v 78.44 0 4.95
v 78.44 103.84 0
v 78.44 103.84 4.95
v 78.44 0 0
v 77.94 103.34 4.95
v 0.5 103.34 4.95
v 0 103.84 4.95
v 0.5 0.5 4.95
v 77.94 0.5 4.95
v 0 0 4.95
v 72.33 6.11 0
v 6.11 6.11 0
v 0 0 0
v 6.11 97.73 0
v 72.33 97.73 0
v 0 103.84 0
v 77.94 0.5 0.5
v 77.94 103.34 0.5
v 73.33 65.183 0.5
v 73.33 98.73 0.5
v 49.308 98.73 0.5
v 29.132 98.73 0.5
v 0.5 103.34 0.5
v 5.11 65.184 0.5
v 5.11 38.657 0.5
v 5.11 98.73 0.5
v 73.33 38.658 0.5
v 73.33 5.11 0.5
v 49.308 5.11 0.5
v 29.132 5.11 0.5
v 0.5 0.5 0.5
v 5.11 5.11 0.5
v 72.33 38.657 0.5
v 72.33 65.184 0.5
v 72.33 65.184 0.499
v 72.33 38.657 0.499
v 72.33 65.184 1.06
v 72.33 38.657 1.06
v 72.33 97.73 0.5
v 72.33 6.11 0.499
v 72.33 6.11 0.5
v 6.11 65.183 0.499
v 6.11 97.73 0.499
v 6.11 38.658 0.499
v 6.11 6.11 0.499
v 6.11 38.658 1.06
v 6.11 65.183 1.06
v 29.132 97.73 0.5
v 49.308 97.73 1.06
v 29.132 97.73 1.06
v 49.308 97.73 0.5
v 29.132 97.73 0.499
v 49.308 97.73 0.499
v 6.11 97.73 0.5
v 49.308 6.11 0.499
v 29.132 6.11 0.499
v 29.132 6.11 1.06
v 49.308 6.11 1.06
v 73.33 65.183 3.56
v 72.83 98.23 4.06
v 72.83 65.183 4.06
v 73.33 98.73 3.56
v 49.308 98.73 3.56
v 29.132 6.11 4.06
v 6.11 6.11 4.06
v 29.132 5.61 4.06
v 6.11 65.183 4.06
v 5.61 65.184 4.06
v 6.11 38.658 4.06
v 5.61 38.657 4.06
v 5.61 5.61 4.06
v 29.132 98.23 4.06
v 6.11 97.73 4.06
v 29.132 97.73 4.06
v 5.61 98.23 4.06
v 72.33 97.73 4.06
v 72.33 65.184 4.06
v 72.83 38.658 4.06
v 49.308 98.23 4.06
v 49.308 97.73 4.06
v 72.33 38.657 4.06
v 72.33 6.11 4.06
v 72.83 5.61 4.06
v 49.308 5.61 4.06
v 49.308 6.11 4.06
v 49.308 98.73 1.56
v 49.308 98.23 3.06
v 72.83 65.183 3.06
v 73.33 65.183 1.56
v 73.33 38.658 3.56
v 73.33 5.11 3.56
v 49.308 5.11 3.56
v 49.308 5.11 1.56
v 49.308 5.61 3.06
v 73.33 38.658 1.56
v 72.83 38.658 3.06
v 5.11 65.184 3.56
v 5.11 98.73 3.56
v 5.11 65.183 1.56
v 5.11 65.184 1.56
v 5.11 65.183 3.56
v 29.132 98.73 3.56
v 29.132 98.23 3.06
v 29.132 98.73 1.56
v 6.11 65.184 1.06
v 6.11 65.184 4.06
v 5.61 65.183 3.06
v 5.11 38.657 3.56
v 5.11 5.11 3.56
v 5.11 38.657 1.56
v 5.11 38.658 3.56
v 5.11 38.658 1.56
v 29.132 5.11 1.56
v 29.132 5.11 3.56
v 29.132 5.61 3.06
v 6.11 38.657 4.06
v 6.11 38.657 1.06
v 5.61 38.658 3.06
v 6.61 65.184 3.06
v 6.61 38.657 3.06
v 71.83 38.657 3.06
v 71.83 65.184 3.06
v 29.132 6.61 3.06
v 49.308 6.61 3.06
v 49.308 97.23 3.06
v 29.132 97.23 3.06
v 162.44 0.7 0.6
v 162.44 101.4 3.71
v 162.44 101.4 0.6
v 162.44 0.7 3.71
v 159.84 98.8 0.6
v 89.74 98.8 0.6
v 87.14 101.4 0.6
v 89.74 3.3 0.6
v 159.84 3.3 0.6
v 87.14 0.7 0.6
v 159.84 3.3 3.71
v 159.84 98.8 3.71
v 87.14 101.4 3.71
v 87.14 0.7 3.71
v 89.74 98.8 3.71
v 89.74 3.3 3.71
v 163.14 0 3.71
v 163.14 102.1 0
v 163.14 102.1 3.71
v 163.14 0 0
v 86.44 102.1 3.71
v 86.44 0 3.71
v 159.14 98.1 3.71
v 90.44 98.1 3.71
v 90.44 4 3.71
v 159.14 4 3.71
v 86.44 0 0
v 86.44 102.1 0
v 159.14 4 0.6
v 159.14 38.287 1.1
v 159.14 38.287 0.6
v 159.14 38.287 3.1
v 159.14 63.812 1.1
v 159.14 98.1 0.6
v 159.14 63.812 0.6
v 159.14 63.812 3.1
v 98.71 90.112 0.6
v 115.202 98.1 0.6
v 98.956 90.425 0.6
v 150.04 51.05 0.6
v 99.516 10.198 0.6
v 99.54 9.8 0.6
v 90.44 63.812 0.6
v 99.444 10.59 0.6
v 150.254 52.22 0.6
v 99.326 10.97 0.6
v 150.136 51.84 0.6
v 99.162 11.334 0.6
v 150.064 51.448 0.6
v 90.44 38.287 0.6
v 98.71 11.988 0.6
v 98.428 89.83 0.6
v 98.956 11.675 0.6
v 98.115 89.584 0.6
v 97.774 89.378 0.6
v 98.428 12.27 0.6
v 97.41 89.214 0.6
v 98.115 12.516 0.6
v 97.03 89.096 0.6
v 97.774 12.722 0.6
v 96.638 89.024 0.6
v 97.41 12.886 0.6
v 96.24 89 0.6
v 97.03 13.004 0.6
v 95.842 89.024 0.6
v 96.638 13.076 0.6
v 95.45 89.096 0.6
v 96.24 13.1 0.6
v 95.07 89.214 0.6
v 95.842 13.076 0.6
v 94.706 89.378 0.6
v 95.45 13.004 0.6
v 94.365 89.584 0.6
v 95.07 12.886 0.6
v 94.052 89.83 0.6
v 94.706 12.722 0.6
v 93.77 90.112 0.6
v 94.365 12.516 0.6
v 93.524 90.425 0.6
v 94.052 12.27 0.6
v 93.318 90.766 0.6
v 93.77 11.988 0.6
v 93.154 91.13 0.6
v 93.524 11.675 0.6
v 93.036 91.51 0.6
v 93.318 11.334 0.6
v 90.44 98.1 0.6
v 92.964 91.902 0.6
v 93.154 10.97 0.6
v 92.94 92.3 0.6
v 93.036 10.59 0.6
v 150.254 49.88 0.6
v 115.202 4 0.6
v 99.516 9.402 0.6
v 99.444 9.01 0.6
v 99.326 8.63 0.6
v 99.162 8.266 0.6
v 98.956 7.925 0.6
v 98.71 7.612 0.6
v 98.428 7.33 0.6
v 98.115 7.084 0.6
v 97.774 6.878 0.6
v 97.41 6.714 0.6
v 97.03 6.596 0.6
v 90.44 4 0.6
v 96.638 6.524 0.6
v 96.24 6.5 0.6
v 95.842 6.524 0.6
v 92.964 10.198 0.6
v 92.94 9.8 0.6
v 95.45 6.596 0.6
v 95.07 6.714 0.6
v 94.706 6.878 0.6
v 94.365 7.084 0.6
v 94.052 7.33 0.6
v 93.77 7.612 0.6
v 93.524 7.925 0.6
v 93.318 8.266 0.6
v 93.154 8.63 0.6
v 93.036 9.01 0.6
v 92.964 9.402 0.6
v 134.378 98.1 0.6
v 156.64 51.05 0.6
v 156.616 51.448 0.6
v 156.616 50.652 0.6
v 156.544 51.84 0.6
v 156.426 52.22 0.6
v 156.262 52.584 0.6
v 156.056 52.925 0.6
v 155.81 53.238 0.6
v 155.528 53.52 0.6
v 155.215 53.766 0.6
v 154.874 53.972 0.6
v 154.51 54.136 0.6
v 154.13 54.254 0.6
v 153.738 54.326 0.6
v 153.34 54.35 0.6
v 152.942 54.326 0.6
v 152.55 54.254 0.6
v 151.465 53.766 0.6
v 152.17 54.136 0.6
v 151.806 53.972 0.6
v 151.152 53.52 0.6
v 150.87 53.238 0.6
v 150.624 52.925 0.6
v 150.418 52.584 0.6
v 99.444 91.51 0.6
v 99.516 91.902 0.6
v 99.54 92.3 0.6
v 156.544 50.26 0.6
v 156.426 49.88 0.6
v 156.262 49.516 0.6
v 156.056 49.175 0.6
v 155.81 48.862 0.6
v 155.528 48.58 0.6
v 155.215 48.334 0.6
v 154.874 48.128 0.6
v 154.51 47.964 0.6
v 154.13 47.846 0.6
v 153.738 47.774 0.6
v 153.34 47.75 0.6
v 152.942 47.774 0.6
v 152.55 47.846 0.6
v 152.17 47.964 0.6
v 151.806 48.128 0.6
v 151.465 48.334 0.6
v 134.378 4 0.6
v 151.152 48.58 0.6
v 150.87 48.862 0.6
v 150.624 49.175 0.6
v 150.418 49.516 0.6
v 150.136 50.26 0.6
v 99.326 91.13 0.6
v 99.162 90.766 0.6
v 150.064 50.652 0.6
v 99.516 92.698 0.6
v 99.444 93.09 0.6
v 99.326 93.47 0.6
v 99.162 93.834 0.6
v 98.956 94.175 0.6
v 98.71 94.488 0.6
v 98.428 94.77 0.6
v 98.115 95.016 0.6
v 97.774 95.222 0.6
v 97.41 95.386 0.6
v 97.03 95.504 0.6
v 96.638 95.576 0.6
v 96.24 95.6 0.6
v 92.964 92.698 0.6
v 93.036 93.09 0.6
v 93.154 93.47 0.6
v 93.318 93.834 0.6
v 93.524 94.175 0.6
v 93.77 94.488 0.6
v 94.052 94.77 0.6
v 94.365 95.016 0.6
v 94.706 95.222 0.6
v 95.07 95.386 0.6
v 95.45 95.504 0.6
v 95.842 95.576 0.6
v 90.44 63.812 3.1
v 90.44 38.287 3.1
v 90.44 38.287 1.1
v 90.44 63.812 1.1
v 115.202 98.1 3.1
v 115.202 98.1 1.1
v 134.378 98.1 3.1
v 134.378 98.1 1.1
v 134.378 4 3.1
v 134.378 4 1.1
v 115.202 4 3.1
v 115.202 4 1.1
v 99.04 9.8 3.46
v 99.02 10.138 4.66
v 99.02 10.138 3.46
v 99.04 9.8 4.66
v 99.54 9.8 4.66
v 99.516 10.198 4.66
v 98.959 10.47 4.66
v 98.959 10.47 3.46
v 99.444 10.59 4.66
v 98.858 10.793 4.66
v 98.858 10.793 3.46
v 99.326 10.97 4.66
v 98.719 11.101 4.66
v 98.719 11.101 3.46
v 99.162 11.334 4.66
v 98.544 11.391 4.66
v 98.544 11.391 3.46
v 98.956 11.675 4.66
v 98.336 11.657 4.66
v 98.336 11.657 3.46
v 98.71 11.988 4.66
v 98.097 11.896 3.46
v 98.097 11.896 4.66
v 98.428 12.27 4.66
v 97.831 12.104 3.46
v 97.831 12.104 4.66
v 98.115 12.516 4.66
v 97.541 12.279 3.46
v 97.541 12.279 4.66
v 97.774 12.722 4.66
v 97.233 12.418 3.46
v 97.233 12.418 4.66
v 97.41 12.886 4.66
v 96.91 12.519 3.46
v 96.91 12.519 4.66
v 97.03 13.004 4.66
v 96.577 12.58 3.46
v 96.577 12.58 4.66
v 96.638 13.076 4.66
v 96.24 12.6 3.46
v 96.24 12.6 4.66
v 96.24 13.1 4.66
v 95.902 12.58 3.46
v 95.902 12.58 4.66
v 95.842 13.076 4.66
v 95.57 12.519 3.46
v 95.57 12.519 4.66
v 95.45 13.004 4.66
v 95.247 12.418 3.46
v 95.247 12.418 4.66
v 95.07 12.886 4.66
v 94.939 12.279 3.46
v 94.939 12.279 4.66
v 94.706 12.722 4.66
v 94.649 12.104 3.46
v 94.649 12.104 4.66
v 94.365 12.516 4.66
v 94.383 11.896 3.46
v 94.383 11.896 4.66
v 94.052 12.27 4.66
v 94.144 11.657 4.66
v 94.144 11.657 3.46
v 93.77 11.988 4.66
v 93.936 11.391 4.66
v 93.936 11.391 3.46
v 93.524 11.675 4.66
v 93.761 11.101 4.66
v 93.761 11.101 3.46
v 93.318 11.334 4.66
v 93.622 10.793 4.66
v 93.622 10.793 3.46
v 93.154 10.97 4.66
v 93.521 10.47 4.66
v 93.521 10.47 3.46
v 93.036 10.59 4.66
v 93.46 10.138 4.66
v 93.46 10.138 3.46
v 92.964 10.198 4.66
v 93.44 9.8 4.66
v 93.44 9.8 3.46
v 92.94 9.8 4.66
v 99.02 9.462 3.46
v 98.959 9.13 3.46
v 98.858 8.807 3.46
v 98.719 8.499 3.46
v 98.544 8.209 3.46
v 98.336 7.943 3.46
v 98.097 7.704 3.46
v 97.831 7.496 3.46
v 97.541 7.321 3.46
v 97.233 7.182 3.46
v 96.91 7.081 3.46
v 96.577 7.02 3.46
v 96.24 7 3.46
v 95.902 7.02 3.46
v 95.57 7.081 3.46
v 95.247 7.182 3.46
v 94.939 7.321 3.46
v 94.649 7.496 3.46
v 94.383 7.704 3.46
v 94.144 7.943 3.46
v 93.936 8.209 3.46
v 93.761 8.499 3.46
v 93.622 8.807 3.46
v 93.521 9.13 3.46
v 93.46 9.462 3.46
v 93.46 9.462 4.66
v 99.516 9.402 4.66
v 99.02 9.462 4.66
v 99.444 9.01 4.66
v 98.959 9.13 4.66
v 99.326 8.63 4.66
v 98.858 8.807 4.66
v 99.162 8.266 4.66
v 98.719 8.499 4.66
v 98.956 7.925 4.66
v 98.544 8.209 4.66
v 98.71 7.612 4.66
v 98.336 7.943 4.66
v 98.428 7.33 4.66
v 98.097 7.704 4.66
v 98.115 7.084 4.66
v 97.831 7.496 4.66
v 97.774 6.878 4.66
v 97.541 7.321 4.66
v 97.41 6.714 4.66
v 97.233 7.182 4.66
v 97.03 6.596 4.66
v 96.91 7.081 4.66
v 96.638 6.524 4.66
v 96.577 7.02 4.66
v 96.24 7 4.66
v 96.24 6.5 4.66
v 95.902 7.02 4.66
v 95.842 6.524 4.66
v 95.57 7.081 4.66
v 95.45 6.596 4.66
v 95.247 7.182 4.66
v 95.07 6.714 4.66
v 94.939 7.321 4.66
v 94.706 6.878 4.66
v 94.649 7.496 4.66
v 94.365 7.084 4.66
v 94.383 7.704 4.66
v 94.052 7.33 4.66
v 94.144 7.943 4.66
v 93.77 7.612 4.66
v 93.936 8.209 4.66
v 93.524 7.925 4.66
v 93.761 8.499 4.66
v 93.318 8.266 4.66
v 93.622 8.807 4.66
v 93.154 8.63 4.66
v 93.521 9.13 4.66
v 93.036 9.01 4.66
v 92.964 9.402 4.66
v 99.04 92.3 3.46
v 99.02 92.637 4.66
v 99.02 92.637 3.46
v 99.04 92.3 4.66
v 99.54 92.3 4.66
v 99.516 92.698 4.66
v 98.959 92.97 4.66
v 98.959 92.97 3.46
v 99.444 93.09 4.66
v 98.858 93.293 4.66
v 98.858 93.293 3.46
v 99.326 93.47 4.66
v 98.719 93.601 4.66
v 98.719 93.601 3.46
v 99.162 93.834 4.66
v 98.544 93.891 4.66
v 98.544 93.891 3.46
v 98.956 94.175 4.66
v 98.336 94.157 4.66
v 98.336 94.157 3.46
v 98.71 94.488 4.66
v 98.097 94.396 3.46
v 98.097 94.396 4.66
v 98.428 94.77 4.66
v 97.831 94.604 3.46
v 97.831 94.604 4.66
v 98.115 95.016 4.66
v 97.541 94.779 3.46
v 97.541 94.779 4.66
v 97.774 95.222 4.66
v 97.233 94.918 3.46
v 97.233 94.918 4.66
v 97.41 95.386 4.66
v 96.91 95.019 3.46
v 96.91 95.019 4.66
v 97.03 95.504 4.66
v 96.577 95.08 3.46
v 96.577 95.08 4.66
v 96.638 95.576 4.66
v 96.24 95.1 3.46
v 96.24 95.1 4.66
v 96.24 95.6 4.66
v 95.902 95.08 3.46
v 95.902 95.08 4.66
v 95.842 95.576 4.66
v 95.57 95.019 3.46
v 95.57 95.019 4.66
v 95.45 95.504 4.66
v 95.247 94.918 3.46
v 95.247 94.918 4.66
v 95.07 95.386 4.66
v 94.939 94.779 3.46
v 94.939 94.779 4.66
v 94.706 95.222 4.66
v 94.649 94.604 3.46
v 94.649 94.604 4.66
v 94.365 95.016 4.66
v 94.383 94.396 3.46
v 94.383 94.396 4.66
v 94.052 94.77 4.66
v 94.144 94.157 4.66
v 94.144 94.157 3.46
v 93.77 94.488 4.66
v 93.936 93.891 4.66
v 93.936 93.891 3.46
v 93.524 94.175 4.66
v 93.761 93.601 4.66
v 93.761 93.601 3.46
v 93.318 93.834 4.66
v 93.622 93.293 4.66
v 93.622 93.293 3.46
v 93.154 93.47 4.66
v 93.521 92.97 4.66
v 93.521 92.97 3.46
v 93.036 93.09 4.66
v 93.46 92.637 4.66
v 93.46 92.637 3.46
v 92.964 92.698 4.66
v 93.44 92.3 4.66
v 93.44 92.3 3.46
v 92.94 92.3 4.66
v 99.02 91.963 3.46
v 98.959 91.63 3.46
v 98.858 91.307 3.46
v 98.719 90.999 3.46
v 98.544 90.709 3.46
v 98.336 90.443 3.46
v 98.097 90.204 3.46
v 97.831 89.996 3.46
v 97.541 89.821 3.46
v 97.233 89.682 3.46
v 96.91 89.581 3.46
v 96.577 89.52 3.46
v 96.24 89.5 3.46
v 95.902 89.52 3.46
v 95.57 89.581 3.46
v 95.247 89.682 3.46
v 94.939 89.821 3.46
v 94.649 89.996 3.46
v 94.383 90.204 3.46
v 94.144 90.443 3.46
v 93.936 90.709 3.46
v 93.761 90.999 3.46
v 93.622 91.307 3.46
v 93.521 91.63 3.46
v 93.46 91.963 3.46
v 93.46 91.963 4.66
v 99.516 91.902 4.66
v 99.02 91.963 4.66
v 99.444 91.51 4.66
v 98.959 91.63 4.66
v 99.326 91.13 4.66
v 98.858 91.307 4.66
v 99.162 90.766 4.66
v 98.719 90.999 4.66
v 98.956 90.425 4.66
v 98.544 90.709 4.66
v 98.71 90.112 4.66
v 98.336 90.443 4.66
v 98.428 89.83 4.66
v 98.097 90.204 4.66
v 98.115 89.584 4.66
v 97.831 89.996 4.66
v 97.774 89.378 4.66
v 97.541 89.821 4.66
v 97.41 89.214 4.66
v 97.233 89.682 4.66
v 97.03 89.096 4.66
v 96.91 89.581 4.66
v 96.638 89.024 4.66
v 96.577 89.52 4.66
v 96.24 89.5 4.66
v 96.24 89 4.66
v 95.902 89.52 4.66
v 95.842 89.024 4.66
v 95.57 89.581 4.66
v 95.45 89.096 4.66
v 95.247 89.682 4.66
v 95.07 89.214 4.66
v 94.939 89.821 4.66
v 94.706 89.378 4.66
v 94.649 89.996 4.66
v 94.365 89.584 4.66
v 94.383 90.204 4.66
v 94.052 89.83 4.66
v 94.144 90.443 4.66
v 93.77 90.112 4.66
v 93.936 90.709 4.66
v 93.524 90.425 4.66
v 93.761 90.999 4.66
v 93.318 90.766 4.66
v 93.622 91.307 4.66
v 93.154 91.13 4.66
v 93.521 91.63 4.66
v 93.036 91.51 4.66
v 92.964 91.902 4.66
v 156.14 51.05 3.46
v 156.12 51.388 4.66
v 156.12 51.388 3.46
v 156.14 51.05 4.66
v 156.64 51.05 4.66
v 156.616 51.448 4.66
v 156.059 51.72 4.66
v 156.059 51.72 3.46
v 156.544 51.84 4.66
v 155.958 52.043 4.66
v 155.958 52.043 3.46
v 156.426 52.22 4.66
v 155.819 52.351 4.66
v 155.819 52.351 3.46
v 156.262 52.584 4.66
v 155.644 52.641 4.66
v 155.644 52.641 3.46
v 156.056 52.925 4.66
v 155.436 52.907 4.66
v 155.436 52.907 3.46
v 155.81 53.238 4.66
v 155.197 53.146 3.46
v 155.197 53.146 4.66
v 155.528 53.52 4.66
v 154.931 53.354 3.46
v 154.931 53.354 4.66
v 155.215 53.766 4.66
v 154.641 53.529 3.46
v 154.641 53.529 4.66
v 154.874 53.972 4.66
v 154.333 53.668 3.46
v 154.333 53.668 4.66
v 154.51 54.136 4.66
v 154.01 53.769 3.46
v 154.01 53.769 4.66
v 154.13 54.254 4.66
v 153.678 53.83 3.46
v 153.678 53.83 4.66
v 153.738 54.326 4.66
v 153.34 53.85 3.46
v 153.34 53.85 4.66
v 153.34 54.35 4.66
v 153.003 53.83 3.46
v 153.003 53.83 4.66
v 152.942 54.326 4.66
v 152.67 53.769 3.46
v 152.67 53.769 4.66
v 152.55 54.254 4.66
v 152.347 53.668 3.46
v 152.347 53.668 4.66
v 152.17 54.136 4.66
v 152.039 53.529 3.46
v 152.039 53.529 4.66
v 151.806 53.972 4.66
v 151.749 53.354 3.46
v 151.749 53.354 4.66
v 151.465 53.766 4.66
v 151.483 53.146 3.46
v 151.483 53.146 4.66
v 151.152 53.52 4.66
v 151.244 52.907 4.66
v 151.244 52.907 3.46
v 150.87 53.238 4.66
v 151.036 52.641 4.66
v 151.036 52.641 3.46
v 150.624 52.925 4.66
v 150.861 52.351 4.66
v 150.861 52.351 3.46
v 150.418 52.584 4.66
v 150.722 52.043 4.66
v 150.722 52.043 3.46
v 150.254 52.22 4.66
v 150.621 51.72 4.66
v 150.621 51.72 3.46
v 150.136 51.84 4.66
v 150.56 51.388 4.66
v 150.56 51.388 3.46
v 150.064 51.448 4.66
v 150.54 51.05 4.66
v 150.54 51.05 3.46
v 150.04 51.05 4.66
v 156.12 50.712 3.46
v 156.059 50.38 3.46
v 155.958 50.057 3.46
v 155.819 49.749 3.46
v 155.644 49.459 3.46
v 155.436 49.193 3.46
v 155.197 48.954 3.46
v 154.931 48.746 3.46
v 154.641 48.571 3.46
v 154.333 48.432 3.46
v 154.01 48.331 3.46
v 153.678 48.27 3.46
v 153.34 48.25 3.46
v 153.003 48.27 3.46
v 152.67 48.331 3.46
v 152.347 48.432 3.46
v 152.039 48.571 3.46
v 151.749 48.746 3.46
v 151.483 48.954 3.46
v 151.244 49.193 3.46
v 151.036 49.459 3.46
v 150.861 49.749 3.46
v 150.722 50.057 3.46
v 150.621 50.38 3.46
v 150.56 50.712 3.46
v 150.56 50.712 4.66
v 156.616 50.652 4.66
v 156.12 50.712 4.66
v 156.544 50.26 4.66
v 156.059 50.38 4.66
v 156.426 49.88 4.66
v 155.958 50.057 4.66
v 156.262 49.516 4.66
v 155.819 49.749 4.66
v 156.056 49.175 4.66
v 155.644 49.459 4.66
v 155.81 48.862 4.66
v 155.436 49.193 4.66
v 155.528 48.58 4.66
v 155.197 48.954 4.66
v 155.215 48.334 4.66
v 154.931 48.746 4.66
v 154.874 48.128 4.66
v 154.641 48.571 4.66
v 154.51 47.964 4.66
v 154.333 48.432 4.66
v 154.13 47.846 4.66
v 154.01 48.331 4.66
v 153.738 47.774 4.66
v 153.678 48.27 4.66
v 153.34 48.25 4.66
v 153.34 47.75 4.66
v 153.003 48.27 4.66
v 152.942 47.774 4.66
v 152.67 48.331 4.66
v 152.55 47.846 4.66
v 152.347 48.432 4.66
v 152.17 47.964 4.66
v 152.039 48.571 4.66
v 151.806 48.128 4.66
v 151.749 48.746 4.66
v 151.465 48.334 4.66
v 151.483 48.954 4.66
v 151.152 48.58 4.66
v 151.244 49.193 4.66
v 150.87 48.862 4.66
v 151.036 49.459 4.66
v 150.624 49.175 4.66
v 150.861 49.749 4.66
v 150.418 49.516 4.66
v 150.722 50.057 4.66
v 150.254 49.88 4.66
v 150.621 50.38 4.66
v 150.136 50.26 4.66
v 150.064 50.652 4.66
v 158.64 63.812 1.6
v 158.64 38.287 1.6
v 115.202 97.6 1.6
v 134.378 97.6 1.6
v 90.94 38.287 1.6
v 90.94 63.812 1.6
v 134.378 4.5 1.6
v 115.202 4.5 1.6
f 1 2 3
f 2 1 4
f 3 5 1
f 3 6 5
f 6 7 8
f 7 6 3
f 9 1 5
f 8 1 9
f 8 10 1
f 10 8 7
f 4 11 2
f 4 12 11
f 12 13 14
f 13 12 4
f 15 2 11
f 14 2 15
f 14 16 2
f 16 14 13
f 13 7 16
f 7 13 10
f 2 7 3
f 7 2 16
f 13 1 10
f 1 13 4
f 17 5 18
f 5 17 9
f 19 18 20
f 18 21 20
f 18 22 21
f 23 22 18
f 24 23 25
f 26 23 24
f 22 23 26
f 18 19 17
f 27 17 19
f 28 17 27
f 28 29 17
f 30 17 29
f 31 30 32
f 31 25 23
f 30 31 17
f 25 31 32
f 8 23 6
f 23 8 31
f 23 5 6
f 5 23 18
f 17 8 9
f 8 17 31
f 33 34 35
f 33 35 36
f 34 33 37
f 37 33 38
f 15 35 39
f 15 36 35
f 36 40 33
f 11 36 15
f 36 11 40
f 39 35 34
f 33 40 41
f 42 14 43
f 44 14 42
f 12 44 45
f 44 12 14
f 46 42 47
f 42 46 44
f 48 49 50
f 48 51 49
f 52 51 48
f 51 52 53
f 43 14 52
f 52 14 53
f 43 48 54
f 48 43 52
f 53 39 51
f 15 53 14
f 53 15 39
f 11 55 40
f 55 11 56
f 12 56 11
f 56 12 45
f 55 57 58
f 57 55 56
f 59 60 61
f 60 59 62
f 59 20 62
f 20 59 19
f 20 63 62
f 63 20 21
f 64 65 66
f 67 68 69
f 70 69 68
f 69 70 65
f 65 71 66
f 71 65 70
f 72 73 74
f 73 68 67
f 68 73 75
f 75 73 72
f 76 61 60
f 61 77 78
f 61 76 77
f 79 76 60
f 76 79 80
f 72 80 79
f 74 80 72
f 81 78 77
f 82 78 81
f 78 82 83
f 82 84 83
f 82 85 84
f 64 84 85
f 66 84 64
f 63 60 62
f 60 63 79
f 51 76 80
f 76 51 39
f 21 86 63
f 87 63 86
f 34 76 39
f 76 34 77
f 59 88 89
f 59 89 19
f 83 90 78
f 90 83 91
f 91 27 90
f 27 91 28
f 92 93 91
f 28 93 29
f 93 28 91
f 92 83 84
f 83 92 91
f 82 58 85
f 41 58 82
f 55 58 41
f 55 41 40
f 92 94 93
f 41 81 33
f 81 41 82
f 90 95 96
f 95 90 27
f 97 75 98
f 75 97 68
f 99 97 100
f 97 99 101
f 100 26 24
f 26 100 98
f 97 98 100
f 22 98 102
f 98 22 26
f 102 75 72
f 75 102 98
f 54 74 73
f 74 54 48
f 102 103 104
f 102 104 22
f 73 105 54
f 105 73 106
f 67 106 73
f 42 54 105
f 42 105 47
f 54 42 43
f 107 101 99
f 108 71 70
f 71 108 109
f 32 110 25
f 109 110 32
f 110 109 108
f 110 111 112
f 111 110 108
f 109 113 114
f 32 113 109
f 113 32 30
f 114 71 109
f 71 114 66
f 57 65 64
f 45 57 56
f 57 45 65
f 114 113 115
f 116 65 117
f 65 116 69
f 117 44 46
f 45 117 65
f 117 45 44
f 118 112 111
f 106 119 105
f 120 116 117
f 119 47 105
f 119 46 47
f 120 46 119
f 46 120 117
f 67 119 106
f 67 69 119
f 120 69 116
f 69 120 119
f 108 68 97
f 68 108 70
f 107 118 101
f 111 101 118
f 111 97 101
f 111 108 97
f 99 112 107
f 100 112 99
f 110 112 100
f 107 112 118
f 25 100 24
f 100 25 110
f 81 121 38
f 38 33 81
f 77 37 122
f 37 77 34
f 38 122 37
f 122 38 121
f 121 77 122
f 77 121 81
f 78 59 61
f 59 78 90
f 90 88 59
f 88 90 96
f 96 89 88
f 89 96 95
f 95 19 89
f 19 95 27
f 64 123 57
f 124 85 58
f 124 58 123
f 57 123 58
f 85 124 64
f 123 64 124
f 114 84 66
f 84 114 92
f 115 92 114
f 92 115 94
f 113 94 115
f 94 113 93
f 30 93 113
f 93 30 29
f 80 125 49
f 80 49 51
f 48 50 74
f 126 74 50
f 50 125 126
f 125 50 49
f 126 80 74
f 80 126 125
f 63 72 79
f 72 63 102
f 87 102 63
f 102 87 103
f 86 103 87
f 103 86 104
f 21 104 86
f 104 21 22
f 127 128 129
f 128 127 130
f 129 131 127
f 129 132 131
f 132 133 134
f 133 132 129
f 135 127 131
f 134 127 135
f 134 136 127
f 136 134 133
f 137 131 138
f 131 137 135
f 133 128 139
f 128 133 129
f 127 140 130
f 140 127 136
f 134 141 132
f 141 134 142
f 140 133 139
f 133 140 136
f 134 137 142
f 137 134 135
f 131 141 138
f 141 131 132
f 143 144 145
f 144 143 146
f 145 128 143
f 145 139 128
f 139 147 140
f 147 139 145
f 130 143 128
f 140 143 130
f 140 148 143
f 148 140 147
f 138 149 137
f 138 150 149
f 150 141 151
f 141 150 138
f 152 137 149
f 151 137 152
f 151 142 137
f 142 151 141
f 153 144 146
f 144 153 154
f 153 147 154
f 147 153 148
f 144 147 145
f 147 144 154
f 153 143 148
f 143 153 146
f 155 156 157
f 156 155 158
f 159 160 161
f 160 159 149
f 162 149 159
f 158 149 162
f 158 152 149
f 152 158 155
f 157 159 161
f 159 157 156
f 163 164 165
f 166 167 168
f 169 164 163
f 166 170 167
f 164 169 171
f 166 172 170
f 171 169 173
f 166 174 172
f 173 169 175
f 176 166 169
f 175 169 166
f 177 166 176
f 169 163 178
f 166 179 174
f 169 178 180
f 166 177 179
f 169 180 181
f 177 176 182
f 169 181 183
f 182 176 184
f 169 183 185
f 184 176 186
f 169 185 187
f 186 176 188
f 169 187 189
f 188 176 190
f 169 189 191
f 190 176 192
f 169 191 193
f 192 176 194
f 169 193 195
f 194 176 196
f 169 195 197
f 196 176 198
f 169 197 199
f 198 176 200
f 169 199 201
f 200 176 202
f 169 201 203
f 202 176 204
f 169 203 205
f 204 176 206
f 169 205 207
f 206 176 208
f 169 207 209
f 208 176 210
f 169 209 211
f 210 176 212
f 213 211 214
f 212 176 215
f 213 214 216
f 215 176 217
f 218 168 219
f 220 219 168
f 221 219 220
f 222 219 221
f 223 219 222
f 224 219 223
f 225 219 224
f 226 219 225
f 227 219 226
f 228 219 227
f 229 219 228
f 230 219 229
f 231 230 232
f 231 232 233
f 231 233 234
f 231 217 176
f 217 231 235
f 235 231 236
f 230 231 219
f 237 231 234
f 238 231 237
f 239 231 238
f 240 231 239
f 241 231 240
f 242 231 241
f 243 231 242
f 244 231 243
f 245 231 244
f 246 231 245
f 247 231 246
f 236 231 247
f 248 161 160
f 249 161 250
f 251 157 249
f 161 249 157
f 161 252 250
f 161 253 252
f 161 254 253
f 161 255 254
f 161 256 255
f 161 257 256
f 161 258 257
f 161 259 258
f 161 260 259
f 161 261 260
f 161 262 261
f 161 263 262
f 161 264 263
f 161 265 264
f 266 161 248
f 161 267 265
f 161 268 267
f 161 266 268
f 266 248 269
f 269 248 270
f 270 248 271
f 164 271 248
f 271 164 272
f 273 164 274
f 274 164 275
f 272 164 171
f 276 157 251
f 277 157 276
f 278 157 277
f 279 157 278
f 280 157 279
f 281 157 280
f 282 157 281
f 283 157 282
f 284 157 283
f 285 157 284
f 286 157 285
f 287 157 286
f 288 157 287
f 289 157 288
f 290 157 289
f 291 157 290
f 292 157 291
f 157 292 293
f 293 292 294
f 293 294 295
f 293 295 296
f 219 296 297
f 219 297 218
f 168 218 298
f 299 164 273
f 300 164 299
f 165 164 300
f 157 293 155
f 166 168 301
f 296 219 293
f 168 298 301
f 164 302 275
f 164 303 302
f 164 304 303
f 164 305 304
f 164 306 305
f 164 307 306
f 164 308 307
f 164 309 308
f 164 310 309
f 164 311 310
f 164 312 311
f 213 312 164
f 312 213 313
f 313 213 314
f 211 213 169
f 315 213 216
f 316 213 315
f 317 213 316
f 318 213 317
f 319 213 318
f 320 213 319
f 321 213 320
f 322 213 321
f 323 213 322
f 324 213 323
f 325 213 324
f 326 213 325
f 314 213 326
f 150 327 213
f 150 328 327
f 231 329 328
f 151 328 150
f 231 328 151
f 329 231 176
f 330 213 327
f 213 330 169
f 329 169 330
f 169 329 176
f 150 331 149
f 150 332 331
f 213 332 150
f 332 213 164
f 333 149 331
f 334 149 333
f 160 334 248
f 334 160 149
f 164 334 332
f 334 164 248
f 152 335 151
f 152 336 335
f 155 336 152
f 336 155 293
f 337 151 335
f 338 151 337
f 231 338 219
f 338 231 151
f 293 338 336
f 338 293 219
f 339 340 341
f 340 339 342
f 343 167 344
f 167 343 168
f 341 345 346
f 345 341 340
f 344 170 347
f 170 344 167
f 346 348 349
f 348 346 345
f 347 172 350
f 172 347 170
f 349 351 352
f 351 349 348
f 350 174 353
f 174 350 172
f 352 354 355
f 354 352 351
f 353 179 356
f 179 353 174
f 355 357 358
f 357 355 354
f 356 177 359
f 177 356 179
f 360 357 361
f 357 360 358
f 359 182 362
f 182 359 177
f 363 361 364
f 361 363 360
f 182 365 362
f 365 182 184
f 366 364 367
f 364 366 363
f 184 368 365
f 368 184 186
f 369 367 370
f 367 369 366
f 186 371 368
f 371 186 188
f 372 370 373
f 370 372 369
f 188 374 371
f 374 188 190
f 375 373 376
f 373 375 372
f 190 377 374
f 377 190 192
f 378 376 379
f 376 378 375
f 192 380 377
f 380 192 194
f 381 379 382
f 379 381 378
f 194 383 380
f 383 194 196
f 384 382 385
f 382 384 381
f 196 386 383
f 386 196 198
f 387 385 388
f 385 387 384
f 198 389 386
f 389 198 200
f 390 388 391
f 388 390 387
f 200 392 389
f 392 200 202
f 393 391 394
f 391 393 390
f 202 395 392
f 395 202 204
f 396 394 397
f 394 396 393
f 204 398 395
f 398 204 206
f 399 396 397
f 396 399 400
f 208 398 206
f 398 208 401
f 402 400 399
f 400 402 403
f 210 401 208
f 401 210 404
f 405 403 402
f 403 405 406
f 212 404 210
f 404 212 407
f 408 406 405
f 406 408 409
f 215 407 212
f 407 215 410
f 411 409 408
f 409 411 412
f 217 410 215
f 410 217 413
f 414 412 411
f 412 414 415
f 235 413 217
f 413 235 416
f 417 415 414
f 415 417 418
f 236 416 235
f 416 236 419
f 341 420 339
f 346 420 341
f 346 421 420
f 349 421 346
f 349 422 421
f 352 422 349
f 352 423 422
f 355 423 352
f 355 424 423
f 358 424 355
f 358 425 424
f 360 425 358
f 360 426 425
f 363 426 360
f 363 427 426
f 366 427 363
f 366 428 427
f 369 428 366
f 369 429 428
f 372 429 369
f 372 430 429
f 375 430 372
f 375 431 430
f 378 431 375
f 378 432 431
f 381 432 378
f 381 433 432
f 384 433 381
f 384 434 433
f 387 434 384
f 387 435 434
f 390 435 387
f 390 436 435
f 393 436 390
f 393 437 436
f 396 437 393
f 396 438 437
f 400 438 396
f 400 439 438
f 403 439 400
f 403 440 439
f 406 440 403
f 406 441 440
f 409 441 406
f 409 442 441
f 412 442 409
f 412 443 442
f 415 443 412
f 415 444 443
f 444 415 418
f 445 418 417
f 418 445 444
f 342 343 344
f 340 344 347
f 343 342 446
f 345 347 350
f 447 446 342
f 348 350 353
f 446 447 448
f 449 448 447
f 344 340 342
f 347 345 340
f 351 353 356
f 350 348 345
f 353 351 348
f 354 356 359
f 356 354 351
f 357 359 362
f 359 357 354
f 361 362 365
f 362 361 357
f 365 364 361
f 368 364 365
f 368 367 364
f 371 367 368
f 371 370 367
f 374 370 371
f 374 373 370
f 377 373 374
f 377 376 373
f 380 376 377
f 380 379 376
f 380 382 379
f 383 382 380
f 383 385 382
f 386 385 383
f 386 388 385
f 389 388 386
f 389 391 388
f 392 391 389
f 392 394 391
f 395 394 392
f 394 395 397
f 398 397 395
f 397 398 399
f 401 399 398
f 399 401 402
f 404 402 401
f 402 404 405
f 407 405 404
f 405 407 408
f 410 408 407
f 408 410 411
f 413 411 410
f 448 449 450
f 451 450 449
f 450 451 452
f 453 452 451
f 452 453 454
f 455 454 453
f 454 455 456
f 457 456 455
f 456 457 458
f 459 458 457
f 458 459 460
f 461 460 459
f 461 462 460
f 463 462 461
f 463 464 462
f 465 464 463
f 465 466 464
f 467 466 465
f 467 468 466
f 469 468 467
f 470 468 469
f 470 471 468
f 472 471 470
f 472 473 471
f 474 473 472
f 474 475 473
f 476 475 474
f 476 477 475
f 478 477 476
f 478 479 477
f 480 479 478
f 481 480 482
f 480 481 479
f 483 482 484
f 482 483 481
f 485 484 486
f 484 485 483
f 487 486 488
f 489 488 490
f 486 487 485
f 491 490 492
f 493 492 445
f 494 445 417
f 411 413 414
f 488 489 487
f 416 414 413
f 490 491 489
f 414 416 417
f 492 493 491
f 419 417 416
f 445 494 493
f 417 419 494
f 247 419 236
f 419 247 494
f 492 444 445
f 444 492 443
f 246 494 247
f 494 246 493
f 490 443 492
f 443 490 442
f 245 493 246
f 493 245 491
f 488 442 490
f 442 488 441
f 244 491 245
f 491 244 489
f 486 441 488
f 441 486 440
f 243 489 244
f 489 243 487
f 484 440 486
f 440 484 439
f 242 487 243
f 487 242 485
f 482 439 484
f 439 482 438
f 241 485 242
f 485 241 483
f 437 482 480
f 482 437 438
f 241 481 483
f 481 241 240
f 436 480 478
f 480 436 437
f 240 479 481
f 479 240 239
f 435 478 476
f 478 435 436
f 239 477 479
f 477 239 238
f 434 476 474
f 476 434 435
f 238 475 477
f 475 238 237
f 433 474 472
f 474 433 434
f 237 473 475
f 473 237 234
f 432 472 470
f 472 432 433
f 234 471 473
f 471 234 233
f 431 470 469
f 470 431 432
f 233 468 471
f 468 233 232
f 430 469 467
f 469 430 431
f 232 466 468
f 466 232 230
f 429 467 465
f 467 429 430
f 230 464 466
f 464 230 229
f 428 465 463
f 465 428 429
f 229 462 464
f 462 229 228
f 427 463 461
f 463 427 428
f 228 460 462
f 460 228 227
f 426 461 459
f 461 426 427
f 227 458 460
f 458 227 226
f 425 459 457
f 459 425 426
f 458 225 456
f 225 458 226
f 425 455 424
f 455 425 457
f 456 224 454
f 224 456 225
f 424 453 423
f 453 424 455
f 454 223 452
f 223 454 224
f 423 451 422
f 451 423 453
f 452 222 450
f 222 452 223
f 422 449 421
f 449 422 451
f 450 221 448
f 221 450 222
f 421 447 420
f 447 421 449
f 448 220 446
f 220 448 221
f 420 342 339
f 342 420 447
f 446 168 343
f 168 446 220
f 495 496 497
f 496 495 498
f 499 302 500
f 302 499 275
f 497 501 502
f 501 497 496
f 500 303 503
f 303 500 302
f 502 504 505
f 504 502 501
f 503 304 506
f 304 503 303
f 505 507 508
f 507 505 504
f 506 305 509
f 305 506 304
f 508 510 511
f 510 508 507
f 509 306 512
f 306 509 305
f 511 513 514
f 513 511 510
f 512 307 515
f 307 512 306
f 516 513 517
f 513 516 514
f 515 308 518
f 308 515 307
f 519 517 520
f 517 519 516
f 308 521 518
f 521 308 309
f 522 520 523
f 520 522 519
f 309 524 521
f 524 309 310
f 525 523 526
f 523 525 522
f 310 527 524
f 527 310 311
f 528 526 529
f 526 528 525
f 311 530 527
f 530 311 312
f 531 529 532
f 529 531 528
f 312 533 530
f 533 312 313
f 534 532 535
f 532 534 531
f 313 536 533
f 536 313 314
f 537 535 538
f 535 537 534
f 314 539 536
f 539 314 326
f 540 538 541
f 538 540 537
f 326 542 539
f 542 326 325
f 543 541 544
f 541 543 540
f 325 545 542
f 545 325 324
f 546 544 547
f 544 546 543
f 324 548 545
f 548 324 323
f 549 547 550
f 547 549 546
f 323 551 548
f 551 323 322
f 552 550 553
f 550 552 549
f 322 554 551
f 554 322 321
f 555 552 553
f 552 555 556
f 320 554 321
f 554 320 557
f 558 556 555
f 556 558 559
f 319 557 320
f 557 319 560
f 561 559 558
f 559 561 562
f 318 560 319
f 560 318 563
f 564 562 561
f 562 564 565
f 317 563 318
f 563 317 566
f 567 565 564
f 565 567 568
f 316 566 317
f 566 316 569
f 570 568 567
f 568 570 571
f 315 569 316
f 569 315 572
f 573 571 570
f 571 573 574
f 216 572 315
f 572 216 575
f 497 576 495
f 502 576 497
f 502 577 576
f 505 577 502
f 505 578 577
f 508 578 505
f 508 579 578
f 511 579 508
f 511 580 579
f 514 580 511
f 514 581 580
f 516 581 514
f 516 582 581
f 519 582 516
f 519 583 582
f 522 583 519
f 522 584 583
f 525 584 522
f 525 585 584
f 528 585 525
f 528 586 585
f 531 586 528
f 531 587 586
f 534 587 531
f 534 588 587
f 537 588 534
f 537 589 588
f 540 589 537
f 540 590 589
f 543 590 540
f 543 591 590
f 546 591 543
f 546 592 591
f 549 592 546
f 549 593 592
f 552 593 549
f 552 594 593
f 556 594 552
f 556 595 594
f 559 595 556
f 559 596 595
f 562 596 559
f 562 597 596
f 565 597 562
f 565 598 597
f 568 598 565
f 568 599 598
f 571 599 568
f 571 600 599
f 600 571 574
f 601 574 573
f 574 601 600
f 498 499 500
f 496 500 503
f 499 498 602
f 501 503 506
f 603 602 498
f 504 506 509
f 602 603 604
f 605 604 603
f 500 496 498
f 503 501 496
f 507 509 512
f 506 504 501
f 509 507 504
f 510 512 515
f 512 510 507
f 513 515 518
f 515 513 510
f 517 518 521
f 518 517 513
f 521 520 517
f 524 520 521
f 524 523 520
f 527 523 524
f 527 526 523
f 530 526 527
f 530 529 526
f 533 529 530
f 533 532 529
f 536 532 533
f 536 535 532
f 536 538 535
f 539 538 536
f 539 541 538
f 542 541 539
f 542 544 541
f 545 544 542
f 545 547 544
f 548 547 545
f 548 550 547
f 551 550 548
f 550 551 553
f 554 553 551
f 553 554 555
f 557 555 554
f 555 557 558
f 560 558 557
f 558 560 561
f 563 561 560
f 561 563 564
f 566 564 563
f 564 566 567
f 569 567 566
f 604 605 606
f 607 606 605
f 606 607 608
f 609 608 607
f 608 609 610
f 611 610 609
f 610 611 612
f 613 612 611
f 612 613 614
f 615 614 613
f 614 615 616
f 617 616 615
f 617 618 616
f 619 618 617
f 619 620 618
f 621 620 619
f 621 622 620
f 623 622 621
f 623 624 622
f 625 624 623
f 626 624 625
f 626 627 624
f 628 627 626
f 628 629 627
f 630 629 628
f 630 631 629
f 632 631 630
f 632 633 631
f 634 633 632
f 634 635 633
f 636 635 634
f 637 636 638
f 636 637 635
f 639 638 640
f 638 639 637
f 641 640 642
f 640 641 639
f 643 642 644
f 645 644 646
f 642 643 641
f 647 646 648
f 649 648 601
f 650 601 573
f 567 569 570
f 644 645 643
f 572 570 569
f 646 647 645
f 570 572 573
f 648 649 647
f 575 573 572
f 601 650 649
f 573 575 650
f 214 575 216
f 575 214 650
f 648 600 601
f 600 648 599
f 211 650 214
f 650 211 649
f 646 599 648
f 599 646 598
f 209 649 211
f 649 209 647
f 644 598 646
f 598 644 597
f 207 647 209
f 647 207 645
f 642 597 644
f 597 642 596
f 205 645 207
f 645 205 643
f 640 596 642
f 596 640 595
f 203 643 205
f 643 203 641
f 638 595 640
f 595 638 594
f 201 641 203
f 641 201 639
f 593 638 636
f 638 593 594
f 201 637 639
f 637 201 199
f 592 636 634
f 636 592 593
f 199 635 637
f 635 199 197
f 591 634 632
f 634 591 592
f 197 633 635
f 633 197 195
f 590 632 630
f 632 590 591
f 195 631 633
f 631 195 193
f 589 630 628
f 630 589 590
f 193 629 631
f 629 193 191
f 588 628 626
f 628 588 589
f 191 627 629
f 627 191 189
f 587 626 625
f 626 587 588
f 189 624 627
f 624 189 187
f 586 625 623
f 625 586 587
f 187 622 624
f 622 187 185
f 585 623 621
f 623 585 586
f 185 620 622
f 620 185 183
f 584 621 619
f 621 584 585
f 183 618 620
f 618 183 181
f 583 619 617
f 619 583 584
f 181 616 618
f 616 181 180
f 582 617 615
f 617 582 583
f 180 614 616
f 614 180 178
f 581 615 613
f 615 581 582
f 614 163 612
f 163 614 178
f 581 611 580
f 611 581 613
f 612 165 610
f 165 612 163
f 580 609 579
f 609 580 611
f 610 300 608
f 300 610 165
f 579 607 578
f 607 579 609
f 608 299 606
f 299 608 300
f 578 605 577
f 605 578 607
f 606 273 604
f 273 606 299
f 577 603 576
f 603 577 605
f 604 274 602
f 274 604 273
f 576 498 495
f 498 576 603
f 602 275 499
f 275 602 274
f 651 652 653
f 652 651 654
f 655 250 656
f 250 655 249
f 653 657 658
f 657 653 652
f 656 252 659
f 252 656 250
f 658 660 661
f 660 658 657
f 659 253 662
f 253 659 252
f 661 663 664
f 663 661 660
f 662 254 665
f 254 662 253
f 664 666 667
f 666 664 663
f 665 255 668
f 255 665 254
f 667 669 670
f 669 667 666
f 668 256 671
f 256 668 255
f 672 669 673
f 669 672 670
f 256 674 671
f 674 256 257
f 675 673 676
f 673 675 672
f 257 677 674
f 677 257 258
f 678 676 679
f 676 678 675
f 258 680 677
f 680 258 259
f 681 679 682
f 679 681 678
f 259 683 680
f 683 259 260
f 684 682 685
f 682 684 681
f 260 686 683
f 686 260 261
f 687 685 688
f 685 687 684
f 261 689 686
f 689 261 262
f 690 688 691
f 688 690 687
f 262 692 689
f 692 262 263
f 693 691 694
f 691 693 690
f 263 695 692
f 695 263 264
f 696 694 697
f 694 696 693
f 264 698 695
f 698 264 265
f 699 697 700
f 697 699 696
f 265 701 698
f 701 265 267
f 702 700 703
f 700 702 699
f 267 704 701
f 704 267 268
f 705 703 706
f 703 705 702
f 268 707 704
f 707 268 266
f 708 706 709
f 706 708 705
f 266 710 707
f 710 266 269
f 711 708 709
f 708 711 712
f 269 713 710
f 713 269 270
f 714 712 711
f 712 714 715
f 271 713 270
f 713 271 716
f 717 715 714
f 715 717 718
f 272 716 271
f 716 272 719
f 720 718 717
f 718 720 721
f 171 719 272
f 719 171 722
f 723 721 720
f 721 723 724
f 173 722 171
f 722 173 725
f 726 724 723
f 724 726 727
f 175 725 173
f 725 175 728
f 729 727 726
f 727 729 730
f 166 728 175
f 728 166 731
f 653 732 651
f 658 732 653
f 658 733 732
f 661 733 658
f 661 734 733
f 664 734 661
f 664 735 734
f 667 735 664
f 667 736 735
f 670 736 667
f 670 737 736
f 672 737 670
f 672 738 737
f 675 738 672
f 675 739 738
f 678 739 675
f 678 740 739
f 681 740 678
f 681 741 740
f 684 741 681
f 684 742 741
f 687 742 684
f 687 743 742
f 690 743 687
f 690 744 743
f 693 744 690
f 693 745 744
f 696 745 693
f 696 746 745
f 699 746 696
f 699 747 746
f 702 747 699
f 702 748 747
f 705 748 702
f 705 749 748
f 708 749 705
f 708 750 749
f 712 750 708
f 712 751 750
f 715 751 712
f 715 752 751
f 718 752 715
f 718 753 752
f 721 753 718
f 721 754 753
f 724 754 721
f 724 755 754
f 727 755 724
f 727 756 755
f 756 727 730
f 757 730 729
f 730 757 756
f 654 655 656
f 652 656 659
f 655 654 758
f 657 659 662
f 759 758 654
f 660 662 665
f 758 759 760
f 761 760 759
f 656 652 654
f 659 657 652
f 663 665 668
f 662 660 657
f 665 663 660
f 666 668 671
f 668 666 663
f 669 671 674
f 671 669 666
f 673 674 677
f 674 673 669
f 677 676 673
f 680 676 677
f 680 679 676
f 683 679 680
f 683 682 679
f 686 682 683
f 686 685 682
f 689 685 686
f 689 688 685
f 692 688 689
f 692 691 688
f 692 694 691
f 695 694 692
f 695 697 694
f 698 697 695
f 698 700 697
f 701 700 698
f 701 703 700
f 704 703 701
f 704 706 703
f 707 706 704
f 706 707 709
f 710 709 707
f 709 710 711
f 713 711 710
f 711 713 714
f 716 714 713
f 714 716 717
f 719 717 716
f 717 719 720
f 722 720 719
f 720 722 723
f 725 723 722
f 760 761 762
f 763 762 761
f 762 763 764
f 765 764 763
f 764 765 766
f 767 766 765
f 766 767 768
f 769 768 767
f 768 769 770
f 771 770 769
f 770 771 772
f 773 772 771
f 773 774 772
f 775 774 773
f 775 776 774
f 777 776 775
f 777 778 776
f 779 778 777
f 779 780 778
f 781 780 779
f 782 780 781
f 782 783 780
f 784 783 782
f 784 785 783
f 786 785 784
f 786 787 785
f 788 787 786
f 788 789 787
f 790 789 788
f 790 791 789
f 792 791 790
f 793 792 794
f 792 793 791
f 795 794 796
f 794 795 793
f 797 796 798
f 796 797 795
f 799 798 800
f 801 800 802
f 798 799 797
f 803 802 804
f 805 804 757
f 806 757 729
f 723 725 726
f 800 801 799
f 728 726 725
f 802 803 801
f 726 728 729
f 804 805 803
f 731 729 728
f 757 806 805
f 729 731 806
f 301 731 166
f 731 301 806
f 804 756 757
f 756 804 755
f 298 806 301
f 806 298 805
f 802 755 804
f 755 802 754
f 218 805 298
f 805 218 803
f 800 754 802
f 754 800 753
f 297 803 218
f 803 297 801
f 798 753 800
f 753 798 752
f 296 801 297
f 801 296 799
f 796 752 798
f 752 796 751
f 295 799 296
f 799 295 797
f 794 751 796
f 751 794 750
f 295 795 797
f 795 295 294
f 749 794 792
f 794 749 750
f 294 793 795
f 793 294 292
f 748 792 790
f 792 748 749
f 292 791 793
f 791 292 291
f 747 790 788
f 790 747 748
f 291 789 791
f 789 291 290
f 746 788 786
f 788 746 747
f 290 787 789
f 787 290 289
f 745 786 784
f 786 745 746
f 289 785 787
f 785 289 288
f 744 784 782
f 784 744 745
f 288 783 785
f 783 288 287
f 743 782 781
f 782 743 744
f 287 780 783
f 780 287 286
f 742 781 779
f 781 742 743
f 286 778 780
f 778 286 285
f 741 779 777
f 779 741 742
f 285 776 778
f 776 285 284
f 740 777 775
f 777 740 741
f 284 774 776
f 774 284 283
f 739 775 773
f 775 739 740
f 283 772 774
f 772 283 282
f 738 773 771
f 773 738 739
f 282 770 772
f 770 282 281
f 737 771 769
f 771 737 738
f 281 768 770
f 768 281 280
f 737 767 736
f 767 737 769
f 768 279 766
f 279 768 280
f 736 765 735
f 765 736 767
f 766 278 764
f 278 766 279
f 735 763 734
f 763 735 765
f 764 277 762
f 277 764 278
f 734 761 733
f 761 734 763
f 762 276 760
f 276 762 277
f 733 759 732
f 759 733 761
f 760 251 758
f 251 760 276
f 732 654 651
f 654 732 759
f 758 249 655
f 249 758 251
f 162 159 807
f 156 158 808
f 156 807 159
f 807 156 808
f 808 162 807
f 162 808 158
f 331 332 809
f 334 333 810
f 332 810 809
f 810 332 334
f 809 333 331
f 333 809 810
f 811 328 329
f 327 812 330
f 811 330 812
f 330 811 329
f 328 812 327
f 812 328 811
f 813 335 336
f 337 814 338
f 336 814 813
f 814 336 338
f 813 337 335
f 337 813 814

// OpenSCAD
/*
 Magnet Block Frame
 Copyright 2024 Tyler Tork
 
 This model is a snap-together case for a refrigerator magnet, to contain artwork that's folded around a 3D-printed block to make a block with "painted" sides, then a transparent sleeve that snaps on from the back to cover the edges of the work in a clear layer that lets their color show through.
 
 This model is parameterized using the Customizer to let you specify the dimensions of the artwork. It assumes art that's laid out as a rectangular picture with a flap attached to each side. Select the Layout as "Artwork template" to get the outline to cut out the paper that will fit the block.
 
 It's designed for easy printing. No supports are required. The "shell" part doesn't have a large surface area in contact with the plate, so you may want a brim. The "block" part has a nice big first layer so it should be fine.
 
 I suggest glueing the back of the artwork to the block so it lies flat. It's up to you whether to use glue to secure the two parts together -- it's not easy to separate them once they snap together so I don't bother.
 
 You will of course have to glue the magnets into position, if you choose to add some.

 The shell is intended to be printed in clear ("natural") material that has a bit of flex to it -- regular old PLA is fine.

 The block doesn't need to be clear, but a light color is good if your artwork is thin enough that the color might show through a little.
 
 The Layout option lets you choose to export either the shell or the block for printing -- not both together. Since they don't need to both be transparent and you can use any inexpensive material for the block, it's unlikely you'll want to print them in a single job.

 Licensed under Creative Commons - Attribution - Non-Commercial - Share Alike
    https://creativecommons.org/licenses/by-nc-sa/4.0/
 */

Layout = "d"; // [d: Assembly diagram, b: Block only, s: Shell only, a:Artwork template]
// (mm) leeway allowed for imprecise printing, depending on your printer and material used.
tolerance = .16; // .01

/* [Artwork dimensions] */

// (mm) Size of picture to appear on front of block:
picture_size = [76.7, 102.1];
// (mm) colored margin to fold around the sides:
flap_width = 4; // .1
// .21=cardstock, .29=photo paper
paper_thickness = .29; // .01

/* [Shell dimensions] */
side_thickness = 0.5;
back_thickness = 0.5;

/* [Block dimensions] */
front_thickness = 0.6;
// the side thickness is the space between the edge and the inner hollow. The wall thickness allows for material savings by making the outer edge of the block hollow.
block_side_thickness = 4.0; // 0.1
block_WALL_thickness = 0.7; // 0.05

/* [Magnet settings] */
magnet_option = 3; // [3:3 round magnets,4:4 round magnets,0:none,1:platforms for magnet tape]
// Need not be a tight fit.
magnet_diameter = 5.6; // .1
// Let magnet protrude a little for better contact in case back not perfectly flat.
magnet_depth = 1.2; // .1

/* [Hidden] */
$fa = 1;
$fs = 0.4;
Tol = tolerance;
fw = flap_width;
ft = front_thickness;
fs = side_thickness;
pt = paper_thickness;
fb = back_thickness;
bs = block_side_thickness;
bw = block_WALL_thickness;
fsi = 1.0;
fe = bs + pt + 2*Tol + fsi + fs;
hmm = magnet_option;
mw = magnet_diameter;
md = magnet_depth;
magnet_offset = bs + 3 + (hmm == 1 ? 0 : mw/2); // distance of center of magnet post from edge of block
dPic = [min(picture_size), max(picture_size)]; // orient small dimension along X axis because the magnet positioning code assumes this is the case.
dBlock = [dPic.x, dPic.y, fw-pt ];
hdBlock = dBlock/2; // for centering adjustments
dShell = dBlock + [(fs+pt)*2+Tol, (fs+pt)*2+Tol, Tol+2*pt+fb];
bfw = bs-.5; // width of diagonal-cut flap on artwork
wedge_ht = .5;
wedge_len = [min(30, dBlock.x/4), min(30, dBlock.y/4)];
magnet_post_ht = dShell.z-ft-pt;

// inward-facing protrusion for the clip fastening.
wedge_poly = [[-.001,0],
    [0, 0],
    [wedge_ht, 1.5],
    [0, 2],
    [0, 2.501],
    [-.001,2.501]
 ];

// the shell's inner vertical surface has a beveled edge along the "flat" part and a groove to mate with the block's wedge.
function groove_poly(flat=false) =
    let(top = Tol+pt+dBlock.z-ft)
    flat
    ? [ [0,-.001],
        [0,top-.5],
        [.5,top],
        [fsi,top],
        [fsi,-.001] ]
    : [ [0,-.001],
        [0,top-2.5],
        [wedge_ht,top-1],
        [0,top-.5],
        [.5,top],
        [fsi,top],
        [wedge_ht+fsi,top-1],
        [fsi,top-3],
        [fsi,-.001] ];

/* create a part-cylinder with a specified angle, and optionally a poking-out bit to connect it to an adjacent slab. For making rounded corners to join flat pieces. The result is oriented like a cylinder -- with the center of curvature at the origin.
    
    extend: if >0 add a connecting piece to overlap the cube you want to butt up against the flat faces.
*/
module roundedCorner(h=10,r=2,angle=90,extend=0, center=false) {
    steps=floor(angle/$fa);
    step = max(1,angle/steps);
    endpoint = [r*cos(angle),r*sin(angle)];
    endExtend = (extend > 0? (extend*[cos(angle+90), sin(angle+90)]):[0,0]);
    echo("endpoint", endpoint, "endExtend", endExtend);
    
    points = concat(
        extend>0?([[0,0],[0,-extend],[r,-extend],[r,0]]):[[0,0],[r,0]],
        [for(a=[0:step:angle-.001]) [r*cos(a),r*sin(a)]],
        [endpoint],
        extend>0?([endpoint+endExtend, endExtend, [0,0]]) : [[0,0]]
    );
    
    linear_extrude(height=h, center=center)
    polygon(points);
}

/* support post for cylindrical magnets, designed to be just tall enough to sit on the back surface of the block and come out flush with the back surface of the shell after they snap together (i.e. it's a little taller than the outer walls of the block). */
module magnetSupport() {
    mr = mw / 2;
    ht = magnet_post_ht+.001;
    points = [ [0,md], [mr,md], [mr,0], [mr+.5,0],
                [mr+.5,ht], [0,ht]];
    
    rotate_extrude()
     polygon(points);
}

/* Create a flat shape showing the cut outline for a paper that will wrap exactly around the block. */
module art_template() {
    pX = [
            [-dPic.x/2, 0],
            [bfw-dPic.x/2, bfw],
            [dPic.x/2-bfw, bfw],
            [dPic.x/2, 0]
         ];
    pY = [
            [0,-dPic.y/2],
            [bfw, bfw-dPic.y/2],
            [bfw, dPic.y/2-bfw],
            [0, dPic.y/2]
         ];
         
    color("yellow") square(dPic, center = true);
    for (d = [-1, 1]) {
        color("gold")
            translate([d*(dPic.x+fw)/2,0,0])
            square([flap_width, dPic.y], center=true);

        color("gold")
            translate([0, d*(dPic.y+fw)/2,0])
            square([dPic.x, flap_width], center=true);
        
        color("white")
            translate([0,d*(fw + dPic.y/2),0])
            scale([1,d,1])
            polygon(pX);
        
        color("white")
            translate([d*(fw + dPic.x/2),0])
            scale([d,1,1])
            polygon(pY);
    }
}

/* The part of inner upright of the shell that includes one corner and two adjacent "flat" sections, up to where they touch the "grooved" section in the middle of the side. */
module shellInnerCorner(x,y) {
    m=.001;
    // create a corner cube beveled on two sides
    ptFlat = groove_poly(true);
    rotate([90,0,0])
    intersection()
    {
        translate([-fsi,0,0]) linear_extrude(fsi) polygon(ptFlat);
            translate([-fsi,0,fsi]) rotate([0,90,0]) linear_extrude(fsi) polygon(ptFlat);
    }
    // attach a wall to the corner that's beveled on one edge.
    translate([-m,-fsi,0])
        rotate([90,0,90])
        linear_extrude(x+m)
        polygon(ptFlat);
    translate([-fsi,y,0])
        rotate([90,0,0])
        linear_extrude(y+m)
        polygon(ptFlat);            
}

/* shell is the transparent outer shell.
   Render oriented for printing, with one corner at the origin. */
module shell() {
    dInner = dShell-[2*fe, 2*fe, 0];
    color("#ccccff", .5)
    union() {
        difference() {
            // the outer box
            cube(dShell);
            // carve out the inside to make a box
            translate([fs,fs,fb])
                cube(dShell-[2*fs,2*fs,0]);
            // cut a hole in the bottom of the box
            translate([fe,fe,-.1])
                cube(dInner);
        }
        // build walls on the inside of the shell to make a U-shaped cross section.
        p = wedge_len+[1,1];
        e = [(dInner.x-p.x)/2, (dInner.y-p.y)/2];
        t = e + [bs,bs];
        // cross section of grooved wall to snap to the wedge on the block part.
        ptFlat = groove_poly(true);
        // cross section of flat beveled wall.
        ptGroove = groove_poly(false);
        center = [dShell.x/2, dShell.y/2];
        xoff = dInner.x/2;
        yoff = dInner.y/2;
        // place a right-angled bit of wall at each inside corner
        for(dx = [-1,1], dy=[-1,1]) {
            translate([center.x-dx*xoff, center.y-dy*yoff, fb])
            scale([dx, dy, 1])
            shellInnerCorner(e.x,e.y);
        }
        // fill in the gaps in the middle of each wall with a grooved section.
        for(par=[[p.y,-1,0],[p.y,1,0],[p.x,0,-1],[p.x,0,1]]) {
            angle = 90*(1+par[1]+par[2]+abs(par[2]));
            translate([center.x+par[1]*(fsi+xoff),center.y+par[2]*(fsi+yoff),fb])
                rotate([90,0,angle])
                linear_extrude(par[0]+.002, center=true)
                polygon(ptGroove);
        }
    }
}

/* block:
    create the part the picture is folded around.
    This is generated with a corner at the origin and laid flat on the XY plane, in printing orientation (front facing down).
*/
module block() {
    // basic shape of block is hollow box.
    color("#ffdddd")
    translate(hdBlock)
    union() {
        difference() {
            cube(dBlock, center=true);
            translate([0,0,ft])
            cube(dBlock-[bs*2,bs*2,0], center=true);
			channelWidth = bs-2*bw;
			echo("channelWidth", channelWidth);
			if (bw >= 0.5 && channelWidth >= 1.5) {
				// don't hollow out the block edge unless the channel is wide enough that we're actually saving material, considering there would generally be infill anyway.
				translate([hdBlock.x-bw-channelWidth, bw-hdBlock.y, ft-hdBlock.z])
				 cube([channelWidth, dBlock.y-2*bw, dBlock.z]);
				translate([bw, bw, ft]-hdBlock)
				 cube([channelWidth, dBlock.y-2*bw, dBlock.z]);
				translate([bw, bw, ft]-hdBlock)
				 cube([dBlock.x-2*bw, channelWidth, dBlock.z]);
				translate([bw-hdBlock.x,hdBlock.y-bw-channelWidth, ft-hdBlock.z])
				 cube([dBlock.x-2*bw, channelWidth, dBlock.z]);
			}
        }
        
        if (hmm == 1) {
            // customizer selected flat areas for magnetic tape.
            translate([0,dBlock.y/2-magnet_offset-6.5,0])
                cube([dBlock.x-magnet_offset*2, 13, dBlock.z], center=true);
            translate([0,-(dBlock.y/2-magnet_offset-6.5),0])
                cube([dBlock.x-magnet_offset*2, 13, dBlock.z], center=true);
        } else if (hmm != 0) {
            // magnet support posts were selected.
            off = [dBlock.x/2-magnet_offset,dBlock.y/2-magnet_offset,ft-dBlock.z/2+magnet_post_ht];
            // 3 or 4 posts
            locs = hmm == 3
                ? [[-1,-1],[-1,1],[1,0]]
                : [[-1,-1],[-1,1],[1,-1],[1,1]];
            for(p = locs) {
                translate([off.x*p.x,off.y*p.y,off.z])
                rotate([0,180,0])
                magnetSupport();
            }
        }
        
        // wedges in the middle of each inner side.
        pads = [[1,0],[0,1],[-1,0],[0,-1]];
        for (i=[0:3]) {
            oy = i%2;
            ox = floor(i/2);
            translate([(dBlock.x/2-bs)*pads[i].x, (dBlock.y/2-bs)*pads[i].y,2.5+ft-dBlock.z/2])
            rotate([90,180,i*90]) linear_extrude(wedge_len[1-oy],center=true) polygon(wedge_poly);
        }
        echo("wedge_len", wedge_len);
    }
}

/* unused, incomplete. */
module foldedPicture() {
    color("gold")
    translate([paper_thickness,paper_thickness,flap_width])
     cube([dPic.x, dPic.y, paper_thickness]);
     
    translate([pt,pt,flap_width])
    rotate([-90,-90,-90])
    roundedCorner(h=dPic.x,r=pt,extend=.001);

    translate([pt,pt,flap_width])
    rotate([-90,180,0])
    roundedCorner(h=dPic.y,r=pt,extend=.001);

    translate([pt+dPic.x,pt+dPic.y,flap_width])
    rotate([0,-90,0])
    roundedCorner(h=dPic.x,r=pt,extend=.001);

    translate([pt+dPic.x,pt,flap_width])
    rotate([-90,-90,0])
    roundedCorner(h=dPic.y,r=pt,extend=.001);
    color("yellow") {
        translate([0,pt,0])
        cube([pt,dPic.y,flap_width]);
        
        translate([pt,0,0])
        cube([dPic.x,pt,flap_width]);

        translate([dPic.x+pt,pt,0])
        cube([pt,dPic.y,flap_width]);
        
        translate([pt,dPic.y+pt,0])
        cube([dPic.x,pt,flap_width]);
    }
    
    if (false) {
    difference() {
        cube([dPic.x+2*paper_thickness, dPic.y+2*paper_thickness, flap_width+paper_thickness]);
        translate([paper_thickness,paper_thickness,-.001])
        cube([dPic.x, dPic.y, flap_width+paper_thickness+.002]);
    }
    if (back_flap_width > 0) {
        translate([dPic.x/2+paper_thickness,dPic.y/2+paper_thickness,0])
        color("white") {
            for (d = [-1, 1]) {
                translate([d*(dPic.x-back_flap_width)/2,0,paper_thickness/2])
                cube([back_flap_width, dPic.y-2*flap_corner_cut-2, paper_thickness], center=true);
            
                translate([0, d*(dPic.y-back_flap_width)/2,paper_thickness/2])
                cube([dPic.x-2*flap_corner_cut-2, back_flap_width, paper_thickness], center=true);
    }    }
        
    }
    }
}

/* Show both parts positioned as they would be when the frame is assembled, with cutouts to view cross section. */
module assemblyDiagram() {
    sleeveOffset = (dShell.x-dBlock.x)/2;
    
    difference() {
        translate([sleeveOffset+dBlock.x, sleeveOffset, dShell.z-pt]) rotate([0,180,0]) block();
        // cross-section chunks to cut out of the block
        translate([dShell.x, 0, 0]) cube([30,magnet_offset*2+fs,20], center=true);
        translate([dShell.x*.75+1, dShell.y/2, -.1]) cube([dShell.x/4, wedge_len.y/2-3, dShell.z+1]);
    }
    
    difference() {
        shell();
        // cross-section chunks to cut out of the shell
        translate([dShell.x, 0, 0]) cube([30,magnet_offset*2+fs,20], center=true);
        translate([dShell.x*.75+1, dShell.y/2, -.1]) cube([dShell.x/4, wedge_len.y/2-2, dShell.z+1]);
    }

    % rotate([90, 0, 0]) translate([0,-7,0]) linear_extrude(.01) text("Pieces are removed to display cross-sections.", size=4);
}

/* Lay out all parts in printing orientation. Normally you won't want to do this because they are generally in different materials. */
module printLayout() {
    shell();
   translate([dShell.x + 8, 0, 0])
        block();
}

module debug() {
    // make a call to whatever module you're debugging.
}

module main() {
    if (Layout == "d")
        if ($preview) assemblyDiagram();
		else printLayout();
    else if (Layout == "a")
        art_template();
    else if (Layout == "x") // not currently selectable.
        debug();
    else if (Layout == "b")
        block();
    else if (Layout == "s")
        shell();
    else // not currently selectable
        printLayout();
}

main();
